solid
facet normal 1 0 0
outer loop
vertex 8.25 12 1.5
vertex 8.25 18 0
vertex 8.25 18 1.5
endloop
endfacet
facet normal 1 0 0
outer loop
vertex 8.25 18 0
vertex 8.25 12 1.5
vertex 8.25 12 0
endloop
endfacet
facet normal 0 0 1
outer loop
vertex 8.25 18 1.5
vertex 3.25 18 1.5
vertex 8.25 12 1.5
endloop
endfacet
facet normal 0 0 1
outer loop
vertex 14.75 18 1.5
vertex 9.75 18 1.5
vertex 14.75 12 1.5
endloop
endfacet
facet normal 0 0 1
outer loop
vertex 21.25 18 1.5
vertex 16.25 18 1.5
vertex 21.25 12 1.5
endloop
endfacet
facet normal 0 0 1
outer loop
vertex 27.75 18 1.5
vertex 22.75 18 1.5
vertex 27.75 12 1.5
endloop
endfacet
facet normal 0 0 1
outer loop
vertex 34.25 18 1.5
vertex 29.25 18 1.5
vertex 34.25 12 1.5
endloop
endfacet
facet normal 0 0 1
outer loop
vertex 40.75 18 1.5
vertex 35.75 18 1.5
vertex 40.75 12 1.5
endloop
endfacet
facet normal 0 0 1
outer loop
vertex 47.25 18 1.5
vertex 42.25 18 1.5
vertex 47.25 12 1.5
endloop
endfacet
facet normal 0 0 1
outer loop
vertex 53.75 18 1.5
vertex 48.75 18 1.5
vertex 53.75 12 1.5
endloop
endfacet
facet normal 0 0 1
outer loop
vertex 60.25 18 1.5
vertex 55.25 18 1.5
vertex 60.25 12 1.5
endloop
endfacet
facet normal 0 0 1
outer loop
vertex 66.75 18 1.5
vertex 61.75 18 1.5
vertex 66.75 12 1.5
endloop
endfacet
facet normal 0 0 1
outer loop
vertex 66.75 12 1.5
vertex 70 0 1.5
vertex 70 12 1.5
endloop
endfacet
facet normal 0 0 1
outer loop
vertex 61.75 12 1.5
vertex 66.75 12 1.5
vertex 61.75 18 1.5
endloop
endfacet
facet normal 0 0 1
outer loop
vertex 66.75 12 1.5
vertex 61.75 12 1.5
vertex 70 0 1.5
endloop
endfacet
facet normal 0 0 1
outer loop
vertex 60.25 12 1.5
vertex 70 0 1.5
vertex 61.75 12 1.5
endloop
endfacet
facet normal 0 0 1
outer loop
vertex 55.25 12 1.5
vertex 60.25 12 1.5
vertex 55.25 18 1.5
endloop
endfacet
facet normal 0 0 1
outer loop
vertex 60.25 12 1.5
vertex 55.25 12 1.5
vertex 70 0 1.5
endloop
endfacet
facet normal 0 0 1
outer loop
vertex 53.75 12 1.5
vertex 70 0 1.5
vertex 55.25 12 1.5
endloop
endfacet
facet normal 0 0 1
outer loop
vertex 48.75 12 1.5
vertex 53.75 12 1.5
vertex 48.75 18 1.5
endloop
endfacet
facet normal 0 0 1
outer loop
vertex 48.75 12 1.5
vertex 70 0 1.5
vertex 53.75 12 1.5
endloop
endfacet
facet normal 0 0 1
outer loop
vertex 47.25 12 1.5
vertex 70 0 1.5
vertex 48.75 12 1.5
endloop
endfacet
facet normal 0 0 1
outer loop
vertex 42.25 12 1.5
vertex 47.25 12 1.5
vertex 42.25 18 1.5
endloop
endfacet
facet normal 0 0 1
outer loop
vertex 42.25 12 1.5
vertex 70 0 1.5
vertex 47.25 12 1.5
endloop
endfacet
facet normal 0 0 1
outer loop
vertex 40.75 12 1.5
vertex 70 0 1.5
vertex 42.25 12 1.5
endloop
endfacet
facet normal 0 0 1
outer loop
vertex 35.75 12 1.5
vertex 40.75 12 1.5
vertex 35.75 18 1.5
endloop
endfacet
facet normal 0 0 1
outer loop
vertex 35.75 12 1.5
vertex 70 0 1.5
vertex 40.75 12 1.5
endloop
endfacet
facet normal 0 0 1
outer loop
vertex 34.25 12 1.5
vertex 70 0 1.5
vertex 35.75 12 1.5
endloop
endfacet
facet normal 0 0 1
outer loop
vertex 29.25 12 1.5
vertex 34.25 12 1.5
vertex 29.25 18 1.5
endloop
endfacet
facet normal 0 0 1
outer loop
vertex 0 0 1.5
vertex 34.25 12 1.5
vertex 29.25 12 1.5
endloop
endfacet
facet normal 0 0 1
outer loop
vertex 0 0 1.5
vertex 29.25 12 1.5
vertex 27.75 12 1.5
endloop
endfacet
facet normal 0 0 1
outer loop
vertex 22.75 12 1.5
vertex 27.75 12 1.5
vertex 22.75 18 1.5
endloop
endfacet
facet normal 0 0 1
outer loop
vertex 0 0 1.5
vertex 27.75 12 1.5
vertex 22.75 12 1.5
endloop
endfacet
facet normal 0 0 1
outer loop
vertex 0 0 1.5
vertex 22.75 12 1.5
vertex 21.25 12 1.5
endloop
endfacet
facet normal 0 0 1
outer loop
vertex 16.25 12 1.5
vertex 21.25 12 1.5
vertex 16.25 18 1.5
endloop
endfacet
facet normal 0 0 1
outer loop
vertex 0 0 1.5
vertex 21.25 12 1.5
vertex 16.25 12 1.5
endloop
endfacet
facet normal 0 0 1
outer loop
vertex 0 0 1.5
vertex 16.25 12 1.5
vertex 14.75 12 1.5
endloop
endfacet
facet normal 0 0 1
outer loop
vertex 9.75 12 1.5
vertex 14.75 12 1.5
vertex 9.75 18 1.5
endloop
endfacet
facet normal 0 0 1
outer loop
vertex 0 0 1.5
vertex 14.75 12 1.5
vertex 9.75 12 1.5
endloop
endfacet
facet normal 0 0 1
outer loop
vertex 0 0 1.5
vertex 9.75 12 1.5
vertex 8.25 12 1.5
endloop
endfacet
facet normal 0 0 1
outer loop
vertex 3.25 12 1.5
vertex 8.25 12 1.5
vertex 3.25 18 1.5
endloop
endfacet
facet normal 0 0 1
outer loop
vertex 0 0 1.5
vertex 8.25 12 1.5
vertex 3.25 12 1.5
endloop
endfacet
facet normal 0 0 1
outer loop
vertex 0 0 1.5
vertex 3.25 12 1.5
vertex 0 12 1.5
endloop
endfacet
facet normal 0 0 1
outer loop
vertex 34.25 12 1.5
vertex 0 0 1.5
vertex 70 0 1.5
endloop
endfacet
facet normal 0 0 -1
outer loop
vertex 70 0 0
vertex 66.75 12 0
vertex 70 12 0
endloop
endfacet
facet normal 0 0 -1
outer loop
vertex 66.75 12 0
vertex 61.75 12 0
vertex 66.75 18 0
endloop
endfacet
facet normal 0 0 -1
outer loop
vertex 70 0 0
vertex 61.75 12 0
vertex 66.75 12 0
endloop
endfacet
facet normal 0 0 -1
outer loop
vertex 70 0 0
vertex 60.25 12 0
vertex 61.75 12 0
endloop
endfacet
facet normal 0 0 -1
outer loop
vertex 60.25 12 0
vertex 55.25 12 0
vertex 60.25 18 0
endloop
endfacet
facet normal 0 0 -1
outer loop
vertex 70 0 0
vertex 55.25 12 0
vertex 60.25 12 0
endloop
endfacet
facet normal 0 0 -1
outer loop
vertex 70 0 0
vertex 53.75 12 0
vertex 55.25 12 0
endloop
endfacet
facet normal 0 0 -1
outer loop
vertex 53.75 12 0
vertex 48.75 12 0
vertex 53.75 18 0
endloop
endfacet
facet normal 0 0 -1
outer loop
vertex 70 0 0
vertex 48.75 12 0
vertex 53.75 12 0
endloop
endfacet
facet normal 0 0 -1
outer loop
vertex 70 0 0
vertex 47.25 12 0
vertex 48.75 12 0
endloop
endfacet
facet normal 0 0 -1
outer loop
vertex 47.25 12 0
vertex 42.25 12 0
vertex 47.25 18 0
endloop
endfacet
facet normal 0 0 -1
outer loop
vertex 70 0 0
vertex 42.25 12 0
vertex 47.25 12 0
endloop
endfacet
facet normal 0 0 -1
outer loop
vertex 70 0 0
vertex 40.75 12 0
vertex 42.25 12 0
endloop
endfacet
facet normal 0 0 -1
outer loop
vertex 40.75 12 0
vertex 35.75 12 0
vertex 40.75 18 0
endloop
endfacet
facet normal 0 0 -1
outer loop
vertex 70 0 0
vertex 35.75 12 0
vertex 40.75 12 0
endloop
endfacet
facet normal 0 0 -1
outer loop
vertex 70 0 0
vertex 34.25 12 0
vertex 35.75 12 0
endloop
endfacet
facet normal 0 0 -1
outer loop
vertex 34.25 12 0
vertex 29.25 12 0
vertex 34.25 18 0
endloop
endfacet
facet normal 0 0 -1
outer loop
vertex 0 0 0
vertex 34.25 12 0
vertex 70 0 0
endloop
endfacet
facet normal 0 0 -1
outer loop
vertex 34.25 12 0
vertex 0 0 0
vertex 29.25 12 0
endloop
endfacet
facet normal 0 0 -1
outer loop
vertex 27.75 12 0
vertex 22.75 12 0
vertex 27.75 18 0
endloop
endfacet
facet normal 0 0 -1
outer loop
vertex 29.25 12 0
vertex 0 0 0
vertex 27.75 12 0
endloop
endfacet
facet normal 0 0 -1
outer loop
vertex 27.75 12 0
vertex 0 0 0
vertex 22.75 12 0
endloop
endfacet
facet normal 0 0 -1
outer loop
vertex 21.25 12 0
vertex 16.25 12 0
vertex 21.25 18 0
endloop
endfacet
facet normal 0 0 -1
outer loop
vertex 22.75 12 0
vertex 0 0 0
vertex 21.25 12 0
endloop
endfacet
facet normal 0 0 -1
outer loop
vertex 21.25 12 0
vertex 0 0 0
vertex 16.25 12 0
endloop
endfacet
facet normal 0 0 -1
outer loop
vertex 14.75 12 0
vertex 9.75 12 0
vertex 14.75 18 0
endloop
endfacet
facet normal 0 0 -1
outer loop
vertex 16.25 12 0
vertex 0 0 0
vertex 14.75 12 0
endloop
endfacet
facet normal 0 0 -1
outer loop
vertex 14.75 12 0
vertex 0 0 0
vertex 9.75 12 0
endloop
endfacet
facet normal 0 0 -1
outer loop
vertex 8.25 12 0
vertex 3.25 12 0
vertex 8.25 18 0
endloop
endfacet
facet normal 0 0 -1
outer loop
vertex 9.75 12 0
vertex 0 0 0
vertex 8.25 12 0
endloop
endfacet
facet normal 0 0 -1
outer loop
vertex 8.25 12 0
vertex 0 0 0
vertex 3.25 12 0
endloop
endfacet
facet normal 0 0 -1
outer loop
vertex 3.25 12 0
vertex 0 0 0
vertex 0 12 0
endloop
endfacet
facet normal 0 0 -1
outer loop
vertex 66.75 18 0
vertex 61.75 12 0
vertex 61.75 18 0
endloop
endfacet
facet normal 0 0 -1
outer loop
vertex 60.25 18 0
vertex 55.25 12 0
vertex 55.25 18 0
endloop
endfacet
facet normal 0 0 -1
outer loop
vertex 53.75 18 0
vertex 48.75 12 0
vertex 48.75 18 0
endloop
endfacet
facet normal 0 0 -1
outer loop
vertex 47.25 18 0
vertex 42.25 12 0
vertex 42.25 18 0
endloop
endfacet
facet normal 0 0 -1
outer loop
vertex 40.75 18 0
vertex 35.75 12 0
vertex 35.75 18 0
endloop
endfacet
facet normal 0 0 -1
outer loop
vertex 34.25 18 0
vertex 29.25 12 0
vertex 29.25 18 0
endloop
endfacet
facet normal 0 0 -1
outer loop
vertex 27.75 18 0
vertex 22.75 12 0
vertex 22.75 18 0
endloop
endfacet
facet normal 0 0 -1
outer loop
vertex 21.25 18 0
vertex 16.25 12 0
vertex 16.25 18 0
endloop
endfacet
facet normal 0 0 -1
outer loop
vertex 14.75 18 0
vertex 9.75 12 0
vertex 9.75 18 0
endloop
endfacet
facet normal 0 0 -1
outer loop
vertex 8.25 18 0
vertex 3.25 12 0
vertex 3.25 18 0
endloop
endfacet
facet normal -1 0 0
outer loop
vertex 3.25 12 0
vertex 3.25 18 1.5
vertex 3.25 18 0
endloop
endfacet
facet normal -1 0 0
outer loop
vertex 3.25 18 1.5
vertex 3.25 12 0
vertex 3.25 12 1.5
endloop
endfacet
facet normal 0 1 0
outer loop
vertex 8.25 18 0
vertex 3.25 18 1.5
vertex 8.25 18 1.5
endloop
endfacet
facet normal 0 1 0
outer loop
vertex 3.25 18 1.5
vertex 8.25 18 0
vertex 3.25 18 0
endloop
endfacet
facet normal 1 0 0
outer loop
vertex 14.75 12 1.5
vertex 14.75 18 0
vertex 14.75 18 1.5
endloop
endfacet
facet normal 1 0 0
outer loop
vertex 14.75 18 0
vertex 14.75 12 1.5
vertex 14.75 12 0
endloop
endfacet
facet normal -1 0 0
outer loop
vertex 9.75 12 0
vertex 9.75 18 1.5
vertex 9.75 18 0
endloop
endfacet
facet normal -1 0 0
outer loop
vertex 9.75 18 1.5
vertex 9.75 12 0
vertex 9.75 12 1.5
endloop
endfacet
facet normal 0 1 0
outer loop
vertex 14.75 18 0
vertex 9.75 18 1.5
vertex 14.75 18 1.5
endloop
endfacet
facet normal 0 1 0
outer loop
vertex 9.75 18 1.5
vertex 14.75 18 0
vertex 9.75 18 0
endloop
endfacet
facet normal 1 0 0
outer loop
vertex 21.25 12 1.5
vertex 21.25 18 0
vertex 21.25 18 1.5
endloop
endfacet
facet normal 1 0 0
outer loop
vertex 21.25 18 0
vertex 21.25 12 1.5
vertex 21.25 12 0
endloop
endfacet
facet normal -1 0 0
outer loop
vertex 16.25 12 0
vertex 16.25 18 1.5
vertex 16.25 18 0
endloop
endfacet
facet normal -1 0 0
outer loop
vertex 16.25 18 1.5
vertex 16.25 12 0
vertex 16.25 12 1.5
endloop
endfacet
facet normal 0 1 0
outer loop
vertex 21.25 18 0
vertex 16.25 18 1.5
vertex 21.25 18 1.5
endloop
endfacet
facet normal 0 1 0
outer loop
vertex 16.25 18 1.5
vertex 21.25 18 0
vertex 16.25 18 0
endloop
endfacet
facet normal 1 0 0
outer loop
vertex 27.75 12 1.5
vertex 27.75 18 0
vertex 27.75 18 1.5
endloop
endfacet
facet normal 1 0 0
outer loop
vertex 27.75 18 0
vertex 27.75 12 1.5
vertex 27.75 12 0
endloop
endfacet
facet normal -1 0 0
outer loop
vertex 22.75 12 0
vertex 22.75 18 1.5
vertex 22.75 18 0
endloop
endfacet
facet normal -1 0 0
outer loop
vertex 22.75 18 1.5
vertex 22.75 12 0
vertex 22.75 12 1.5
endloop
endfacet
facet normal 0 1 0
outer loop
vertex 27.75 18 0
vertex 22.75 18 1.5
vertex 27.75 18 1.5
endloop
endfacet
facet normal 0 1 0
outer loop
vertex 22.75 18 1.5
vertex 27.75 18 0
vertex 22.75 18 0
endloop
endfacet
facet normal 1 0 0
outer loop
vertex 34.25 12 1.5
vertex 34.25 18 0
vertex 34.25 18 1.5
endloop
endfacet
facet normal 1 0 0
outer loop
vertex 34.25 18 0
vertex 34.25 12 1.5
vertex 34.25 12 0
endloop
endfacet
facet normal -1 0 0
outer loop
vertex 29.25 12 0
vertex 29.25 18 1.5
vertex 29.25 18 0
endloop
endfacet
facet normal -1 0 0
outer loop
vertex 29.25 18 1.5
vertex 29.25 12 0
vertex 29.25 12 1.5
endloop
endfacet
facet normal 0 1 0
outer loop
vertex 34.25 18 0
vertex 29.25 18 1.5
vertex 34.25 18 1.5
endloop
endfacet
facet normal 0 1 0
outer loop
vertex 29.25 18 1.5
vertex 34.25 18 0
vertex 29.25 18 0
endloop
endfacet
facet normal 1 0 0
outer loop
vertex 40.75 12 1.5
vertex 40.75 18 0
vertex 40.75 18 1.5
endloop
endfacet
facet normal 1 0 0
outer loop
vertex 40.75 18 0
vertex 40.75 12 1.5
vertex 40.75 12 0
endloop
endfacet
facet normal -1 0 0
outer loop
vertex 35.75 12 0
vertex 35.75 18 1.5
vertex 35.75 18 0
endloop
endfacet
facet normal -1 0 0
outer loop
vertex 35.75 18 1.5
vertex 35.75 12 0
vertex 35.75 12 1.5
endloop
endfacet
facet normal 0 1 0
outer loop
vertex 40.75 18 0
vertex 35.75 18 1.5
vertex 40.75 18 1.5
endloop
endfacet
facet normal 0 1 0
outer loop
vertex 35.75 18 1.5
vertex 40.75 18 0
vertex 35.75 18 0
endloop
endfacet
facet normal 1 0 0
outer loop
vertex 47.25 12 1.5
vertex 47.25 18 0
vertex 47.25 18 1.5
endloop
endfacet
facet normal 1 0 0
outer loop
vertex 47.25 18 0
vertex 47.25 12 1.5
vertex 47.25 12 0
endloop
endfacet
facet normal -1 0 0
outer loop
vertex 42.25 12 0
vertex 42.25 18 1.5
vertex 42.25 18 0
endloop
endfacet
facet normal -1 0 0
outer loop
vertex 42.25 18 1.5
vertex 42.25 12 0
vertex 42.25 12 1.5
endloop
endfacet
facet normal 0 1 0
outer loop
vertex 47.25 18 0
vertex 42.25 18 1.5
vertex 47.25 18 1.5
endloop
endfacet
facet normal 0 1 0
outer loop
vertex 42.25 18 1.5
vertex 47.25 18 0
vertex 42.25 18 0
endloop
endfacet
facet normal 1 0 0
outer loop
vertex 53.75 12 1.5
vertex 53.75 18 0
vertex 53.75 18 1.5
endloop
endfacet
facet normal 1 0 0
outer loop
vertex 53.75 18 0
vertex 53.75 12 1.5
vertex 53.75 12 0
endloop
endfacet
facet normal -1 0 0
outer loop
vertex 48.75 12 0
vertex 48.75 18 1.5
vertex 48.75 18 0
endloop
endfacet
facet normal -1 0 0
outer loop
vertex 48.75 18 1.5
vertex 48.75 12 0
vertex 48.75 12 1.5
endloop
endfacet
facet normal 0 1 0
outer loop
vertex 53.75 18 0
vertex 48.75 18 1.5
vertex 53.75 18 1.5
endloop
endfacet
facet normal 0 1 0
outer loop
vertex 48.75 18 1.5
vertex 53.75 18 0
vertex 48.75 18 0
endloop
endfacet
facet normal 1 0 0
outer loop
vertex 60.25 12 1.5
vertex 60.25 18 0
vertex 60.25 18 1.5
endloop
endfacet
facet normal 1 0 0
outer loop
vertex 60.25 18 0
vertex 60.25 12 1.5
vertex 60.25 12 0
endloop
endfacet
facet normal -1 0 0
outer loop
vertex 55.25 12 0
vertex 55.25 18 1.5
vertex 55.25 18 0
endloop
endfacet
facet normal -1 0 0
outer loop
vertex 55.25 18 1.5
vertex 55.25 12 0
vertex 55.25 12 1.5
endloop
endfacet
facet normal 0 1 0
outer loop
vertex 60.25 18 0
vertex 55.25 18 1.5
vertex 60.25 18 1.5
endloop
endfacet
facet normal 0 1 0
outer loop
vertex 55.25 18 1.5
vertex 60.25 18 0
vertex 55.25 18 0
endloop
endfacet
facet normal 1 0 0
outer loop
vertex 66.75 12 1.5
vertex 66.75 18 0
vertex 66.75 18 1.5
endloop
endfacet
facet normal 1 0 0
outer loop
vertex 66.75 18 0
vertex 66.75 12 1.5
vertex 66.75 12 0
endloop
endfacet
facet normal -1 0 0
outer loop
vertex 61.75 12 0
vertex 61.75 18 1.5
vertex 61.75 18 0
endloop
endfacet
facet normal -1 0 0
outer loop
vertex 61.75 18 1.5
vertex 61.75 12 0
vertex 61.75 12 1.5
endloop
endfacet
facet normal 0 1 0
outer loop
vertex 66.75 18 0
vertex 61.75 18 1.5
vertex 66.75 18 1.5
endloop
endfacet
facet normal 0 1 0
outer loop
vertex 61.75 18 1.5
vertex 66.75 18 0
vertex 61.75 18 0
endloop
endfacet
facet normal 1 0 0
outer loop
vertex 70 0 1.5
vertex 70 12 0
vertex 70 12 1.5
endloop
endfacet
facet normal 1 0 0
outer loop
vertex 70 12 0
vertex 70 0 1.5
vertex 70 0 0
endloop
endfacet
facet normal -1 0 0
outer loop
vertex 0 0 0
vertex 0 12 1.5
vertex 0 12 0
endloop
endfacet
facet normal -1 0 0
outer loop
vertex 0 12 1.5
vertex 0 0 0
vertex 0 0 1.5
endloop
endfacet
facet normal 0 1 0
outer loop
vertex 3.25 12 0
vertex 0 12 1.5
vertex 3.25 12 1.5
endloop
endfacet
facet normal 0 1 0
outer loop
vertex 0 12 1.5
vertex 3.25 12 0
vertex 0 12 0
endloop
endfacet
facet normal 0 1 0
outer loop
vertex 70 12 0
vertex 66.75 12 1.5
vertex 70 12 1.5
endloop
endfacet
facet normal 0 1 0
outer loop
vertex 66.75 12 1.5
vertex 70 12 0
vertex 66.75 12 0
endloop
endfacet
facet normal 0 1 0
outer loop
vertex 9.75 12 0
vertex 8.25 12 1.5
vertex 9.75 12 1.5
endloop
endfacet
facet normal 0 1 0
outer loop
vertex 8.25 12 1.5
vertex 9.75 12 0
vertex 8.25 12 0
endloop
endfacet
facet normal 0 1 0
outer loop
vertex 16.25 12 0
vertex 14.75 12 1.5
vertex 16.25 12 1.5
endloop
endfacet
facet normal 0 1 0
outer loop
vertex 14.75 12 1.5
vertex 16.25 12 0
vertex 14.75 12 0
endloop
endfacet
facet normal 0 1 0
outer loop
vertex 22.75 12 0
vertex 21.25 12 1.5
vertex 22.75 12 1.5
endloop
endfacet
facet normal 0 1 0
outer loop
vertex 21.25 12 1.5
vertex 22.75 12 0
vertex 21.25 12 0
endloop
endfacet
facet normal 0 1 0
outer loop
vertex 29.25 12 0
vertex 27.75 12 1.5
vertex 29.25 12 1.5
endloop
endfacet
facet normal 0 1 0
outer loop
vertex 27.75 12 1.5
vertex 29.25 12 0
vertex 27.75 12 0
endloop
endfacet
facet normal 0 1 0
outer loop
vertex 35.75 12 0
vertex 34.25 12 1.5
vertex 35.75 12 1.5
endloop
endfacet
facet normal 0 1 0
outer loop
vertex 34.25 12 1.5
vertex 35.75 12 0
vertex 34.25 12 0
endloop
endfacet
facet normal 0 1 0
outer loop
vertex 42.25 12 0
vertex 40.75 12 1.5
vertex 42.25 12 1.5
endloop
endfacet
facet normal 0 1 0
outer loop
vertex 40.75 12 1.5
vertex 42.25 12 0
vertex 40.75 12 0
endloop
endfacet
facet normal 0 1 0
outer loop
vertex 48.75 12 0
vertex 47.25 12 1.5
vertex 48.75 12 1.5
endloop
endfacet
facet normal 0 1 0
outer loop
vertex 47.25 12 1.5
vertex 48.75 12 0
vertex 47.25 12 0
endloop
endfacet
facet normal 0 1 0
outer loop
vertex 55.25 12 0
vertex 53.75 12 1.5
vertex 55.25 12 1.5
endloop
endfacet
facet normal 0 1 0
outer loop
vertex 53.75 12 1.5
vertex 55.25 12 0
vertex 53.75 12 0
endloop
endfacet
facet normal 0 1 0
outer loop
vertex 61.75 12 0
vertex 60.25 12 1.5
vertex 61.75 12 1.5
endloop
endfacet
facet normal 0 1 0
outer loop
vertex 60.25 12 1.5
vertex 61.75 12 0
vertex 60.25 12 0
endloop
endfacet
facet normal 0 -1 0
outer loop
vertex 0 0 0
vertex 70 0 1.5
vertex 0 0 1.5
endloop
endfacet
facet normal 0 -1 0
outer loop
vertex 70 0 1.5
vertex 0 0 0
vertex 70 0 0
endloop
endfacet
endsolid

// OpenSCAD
$fn = 64;

// Dimensions
SPINE_LENGTH_X = 70;
SPINE_WIDTH_Y = 12;
SPINE_THICK_Z = 1.5;

TOOTH_COUNT = 10;
TOOTH_WIDTH_X = 5.0;
TOOTH_LENGTH_Y = 12;
TOOTH_THICK_Z = 1.5;

GAP_X = 1.5;

// Spine is centered at origin (0,0,0)
// Spine Y range: -6 to +6 (12 mm total)
// Spine Z range: 0 to 1.5

// Teeth hang from Y=+6 edge in the -Y direction
// Tooth Y range: +6 to -6 (12 mm total)
// Tooth X range: centered on spine

// Calculate tooth row centering
// Total tooth row length = 10 * 5.0 + 9 * 1.5 = 50 + 13.5 = 63.5 mm
// Center offset from spine edge = (70 - 63.5) / 2 = 3.25 mm

// Tooth positions in X
// Start X = 3.25
// Step X = 5.0 + 1.5 = 6.5

union() {
    // Spine - centered at origin, Y from -6 to +6
    translate([0, 0, 0])
    cube([SPINE_LENGTH_X, SPINE_WIDTH_Y, SPINE_THICK_Z]);

    // Teeth - hang from Y=+6 edge in the -Y direction
    for (i = [0 : TOOTH_COUNT - 1]) {
        // Calculate X position for this tooth
        x_center = (SPINE_LENGTH_X - (TOOTH_COUNT * TOOTH_WIDTH_X + (TOOTH_COUNT - 1) * GAP_X)) / 2;
        x_pos = x_center + i * (TOOTH_WIDTH_X + GAP_X);

        // Translate to position - teeth hang from Y=+6 edge in -Y direction
        // Tooth Y range: +6 to -6 (12 mm)
        translate([x_pos, 6, 0])
        cube([TOOTH_WIDTH_X, TOOTH_LENGTH_Y, TOOTH_THICK_Z]);
    }
}
